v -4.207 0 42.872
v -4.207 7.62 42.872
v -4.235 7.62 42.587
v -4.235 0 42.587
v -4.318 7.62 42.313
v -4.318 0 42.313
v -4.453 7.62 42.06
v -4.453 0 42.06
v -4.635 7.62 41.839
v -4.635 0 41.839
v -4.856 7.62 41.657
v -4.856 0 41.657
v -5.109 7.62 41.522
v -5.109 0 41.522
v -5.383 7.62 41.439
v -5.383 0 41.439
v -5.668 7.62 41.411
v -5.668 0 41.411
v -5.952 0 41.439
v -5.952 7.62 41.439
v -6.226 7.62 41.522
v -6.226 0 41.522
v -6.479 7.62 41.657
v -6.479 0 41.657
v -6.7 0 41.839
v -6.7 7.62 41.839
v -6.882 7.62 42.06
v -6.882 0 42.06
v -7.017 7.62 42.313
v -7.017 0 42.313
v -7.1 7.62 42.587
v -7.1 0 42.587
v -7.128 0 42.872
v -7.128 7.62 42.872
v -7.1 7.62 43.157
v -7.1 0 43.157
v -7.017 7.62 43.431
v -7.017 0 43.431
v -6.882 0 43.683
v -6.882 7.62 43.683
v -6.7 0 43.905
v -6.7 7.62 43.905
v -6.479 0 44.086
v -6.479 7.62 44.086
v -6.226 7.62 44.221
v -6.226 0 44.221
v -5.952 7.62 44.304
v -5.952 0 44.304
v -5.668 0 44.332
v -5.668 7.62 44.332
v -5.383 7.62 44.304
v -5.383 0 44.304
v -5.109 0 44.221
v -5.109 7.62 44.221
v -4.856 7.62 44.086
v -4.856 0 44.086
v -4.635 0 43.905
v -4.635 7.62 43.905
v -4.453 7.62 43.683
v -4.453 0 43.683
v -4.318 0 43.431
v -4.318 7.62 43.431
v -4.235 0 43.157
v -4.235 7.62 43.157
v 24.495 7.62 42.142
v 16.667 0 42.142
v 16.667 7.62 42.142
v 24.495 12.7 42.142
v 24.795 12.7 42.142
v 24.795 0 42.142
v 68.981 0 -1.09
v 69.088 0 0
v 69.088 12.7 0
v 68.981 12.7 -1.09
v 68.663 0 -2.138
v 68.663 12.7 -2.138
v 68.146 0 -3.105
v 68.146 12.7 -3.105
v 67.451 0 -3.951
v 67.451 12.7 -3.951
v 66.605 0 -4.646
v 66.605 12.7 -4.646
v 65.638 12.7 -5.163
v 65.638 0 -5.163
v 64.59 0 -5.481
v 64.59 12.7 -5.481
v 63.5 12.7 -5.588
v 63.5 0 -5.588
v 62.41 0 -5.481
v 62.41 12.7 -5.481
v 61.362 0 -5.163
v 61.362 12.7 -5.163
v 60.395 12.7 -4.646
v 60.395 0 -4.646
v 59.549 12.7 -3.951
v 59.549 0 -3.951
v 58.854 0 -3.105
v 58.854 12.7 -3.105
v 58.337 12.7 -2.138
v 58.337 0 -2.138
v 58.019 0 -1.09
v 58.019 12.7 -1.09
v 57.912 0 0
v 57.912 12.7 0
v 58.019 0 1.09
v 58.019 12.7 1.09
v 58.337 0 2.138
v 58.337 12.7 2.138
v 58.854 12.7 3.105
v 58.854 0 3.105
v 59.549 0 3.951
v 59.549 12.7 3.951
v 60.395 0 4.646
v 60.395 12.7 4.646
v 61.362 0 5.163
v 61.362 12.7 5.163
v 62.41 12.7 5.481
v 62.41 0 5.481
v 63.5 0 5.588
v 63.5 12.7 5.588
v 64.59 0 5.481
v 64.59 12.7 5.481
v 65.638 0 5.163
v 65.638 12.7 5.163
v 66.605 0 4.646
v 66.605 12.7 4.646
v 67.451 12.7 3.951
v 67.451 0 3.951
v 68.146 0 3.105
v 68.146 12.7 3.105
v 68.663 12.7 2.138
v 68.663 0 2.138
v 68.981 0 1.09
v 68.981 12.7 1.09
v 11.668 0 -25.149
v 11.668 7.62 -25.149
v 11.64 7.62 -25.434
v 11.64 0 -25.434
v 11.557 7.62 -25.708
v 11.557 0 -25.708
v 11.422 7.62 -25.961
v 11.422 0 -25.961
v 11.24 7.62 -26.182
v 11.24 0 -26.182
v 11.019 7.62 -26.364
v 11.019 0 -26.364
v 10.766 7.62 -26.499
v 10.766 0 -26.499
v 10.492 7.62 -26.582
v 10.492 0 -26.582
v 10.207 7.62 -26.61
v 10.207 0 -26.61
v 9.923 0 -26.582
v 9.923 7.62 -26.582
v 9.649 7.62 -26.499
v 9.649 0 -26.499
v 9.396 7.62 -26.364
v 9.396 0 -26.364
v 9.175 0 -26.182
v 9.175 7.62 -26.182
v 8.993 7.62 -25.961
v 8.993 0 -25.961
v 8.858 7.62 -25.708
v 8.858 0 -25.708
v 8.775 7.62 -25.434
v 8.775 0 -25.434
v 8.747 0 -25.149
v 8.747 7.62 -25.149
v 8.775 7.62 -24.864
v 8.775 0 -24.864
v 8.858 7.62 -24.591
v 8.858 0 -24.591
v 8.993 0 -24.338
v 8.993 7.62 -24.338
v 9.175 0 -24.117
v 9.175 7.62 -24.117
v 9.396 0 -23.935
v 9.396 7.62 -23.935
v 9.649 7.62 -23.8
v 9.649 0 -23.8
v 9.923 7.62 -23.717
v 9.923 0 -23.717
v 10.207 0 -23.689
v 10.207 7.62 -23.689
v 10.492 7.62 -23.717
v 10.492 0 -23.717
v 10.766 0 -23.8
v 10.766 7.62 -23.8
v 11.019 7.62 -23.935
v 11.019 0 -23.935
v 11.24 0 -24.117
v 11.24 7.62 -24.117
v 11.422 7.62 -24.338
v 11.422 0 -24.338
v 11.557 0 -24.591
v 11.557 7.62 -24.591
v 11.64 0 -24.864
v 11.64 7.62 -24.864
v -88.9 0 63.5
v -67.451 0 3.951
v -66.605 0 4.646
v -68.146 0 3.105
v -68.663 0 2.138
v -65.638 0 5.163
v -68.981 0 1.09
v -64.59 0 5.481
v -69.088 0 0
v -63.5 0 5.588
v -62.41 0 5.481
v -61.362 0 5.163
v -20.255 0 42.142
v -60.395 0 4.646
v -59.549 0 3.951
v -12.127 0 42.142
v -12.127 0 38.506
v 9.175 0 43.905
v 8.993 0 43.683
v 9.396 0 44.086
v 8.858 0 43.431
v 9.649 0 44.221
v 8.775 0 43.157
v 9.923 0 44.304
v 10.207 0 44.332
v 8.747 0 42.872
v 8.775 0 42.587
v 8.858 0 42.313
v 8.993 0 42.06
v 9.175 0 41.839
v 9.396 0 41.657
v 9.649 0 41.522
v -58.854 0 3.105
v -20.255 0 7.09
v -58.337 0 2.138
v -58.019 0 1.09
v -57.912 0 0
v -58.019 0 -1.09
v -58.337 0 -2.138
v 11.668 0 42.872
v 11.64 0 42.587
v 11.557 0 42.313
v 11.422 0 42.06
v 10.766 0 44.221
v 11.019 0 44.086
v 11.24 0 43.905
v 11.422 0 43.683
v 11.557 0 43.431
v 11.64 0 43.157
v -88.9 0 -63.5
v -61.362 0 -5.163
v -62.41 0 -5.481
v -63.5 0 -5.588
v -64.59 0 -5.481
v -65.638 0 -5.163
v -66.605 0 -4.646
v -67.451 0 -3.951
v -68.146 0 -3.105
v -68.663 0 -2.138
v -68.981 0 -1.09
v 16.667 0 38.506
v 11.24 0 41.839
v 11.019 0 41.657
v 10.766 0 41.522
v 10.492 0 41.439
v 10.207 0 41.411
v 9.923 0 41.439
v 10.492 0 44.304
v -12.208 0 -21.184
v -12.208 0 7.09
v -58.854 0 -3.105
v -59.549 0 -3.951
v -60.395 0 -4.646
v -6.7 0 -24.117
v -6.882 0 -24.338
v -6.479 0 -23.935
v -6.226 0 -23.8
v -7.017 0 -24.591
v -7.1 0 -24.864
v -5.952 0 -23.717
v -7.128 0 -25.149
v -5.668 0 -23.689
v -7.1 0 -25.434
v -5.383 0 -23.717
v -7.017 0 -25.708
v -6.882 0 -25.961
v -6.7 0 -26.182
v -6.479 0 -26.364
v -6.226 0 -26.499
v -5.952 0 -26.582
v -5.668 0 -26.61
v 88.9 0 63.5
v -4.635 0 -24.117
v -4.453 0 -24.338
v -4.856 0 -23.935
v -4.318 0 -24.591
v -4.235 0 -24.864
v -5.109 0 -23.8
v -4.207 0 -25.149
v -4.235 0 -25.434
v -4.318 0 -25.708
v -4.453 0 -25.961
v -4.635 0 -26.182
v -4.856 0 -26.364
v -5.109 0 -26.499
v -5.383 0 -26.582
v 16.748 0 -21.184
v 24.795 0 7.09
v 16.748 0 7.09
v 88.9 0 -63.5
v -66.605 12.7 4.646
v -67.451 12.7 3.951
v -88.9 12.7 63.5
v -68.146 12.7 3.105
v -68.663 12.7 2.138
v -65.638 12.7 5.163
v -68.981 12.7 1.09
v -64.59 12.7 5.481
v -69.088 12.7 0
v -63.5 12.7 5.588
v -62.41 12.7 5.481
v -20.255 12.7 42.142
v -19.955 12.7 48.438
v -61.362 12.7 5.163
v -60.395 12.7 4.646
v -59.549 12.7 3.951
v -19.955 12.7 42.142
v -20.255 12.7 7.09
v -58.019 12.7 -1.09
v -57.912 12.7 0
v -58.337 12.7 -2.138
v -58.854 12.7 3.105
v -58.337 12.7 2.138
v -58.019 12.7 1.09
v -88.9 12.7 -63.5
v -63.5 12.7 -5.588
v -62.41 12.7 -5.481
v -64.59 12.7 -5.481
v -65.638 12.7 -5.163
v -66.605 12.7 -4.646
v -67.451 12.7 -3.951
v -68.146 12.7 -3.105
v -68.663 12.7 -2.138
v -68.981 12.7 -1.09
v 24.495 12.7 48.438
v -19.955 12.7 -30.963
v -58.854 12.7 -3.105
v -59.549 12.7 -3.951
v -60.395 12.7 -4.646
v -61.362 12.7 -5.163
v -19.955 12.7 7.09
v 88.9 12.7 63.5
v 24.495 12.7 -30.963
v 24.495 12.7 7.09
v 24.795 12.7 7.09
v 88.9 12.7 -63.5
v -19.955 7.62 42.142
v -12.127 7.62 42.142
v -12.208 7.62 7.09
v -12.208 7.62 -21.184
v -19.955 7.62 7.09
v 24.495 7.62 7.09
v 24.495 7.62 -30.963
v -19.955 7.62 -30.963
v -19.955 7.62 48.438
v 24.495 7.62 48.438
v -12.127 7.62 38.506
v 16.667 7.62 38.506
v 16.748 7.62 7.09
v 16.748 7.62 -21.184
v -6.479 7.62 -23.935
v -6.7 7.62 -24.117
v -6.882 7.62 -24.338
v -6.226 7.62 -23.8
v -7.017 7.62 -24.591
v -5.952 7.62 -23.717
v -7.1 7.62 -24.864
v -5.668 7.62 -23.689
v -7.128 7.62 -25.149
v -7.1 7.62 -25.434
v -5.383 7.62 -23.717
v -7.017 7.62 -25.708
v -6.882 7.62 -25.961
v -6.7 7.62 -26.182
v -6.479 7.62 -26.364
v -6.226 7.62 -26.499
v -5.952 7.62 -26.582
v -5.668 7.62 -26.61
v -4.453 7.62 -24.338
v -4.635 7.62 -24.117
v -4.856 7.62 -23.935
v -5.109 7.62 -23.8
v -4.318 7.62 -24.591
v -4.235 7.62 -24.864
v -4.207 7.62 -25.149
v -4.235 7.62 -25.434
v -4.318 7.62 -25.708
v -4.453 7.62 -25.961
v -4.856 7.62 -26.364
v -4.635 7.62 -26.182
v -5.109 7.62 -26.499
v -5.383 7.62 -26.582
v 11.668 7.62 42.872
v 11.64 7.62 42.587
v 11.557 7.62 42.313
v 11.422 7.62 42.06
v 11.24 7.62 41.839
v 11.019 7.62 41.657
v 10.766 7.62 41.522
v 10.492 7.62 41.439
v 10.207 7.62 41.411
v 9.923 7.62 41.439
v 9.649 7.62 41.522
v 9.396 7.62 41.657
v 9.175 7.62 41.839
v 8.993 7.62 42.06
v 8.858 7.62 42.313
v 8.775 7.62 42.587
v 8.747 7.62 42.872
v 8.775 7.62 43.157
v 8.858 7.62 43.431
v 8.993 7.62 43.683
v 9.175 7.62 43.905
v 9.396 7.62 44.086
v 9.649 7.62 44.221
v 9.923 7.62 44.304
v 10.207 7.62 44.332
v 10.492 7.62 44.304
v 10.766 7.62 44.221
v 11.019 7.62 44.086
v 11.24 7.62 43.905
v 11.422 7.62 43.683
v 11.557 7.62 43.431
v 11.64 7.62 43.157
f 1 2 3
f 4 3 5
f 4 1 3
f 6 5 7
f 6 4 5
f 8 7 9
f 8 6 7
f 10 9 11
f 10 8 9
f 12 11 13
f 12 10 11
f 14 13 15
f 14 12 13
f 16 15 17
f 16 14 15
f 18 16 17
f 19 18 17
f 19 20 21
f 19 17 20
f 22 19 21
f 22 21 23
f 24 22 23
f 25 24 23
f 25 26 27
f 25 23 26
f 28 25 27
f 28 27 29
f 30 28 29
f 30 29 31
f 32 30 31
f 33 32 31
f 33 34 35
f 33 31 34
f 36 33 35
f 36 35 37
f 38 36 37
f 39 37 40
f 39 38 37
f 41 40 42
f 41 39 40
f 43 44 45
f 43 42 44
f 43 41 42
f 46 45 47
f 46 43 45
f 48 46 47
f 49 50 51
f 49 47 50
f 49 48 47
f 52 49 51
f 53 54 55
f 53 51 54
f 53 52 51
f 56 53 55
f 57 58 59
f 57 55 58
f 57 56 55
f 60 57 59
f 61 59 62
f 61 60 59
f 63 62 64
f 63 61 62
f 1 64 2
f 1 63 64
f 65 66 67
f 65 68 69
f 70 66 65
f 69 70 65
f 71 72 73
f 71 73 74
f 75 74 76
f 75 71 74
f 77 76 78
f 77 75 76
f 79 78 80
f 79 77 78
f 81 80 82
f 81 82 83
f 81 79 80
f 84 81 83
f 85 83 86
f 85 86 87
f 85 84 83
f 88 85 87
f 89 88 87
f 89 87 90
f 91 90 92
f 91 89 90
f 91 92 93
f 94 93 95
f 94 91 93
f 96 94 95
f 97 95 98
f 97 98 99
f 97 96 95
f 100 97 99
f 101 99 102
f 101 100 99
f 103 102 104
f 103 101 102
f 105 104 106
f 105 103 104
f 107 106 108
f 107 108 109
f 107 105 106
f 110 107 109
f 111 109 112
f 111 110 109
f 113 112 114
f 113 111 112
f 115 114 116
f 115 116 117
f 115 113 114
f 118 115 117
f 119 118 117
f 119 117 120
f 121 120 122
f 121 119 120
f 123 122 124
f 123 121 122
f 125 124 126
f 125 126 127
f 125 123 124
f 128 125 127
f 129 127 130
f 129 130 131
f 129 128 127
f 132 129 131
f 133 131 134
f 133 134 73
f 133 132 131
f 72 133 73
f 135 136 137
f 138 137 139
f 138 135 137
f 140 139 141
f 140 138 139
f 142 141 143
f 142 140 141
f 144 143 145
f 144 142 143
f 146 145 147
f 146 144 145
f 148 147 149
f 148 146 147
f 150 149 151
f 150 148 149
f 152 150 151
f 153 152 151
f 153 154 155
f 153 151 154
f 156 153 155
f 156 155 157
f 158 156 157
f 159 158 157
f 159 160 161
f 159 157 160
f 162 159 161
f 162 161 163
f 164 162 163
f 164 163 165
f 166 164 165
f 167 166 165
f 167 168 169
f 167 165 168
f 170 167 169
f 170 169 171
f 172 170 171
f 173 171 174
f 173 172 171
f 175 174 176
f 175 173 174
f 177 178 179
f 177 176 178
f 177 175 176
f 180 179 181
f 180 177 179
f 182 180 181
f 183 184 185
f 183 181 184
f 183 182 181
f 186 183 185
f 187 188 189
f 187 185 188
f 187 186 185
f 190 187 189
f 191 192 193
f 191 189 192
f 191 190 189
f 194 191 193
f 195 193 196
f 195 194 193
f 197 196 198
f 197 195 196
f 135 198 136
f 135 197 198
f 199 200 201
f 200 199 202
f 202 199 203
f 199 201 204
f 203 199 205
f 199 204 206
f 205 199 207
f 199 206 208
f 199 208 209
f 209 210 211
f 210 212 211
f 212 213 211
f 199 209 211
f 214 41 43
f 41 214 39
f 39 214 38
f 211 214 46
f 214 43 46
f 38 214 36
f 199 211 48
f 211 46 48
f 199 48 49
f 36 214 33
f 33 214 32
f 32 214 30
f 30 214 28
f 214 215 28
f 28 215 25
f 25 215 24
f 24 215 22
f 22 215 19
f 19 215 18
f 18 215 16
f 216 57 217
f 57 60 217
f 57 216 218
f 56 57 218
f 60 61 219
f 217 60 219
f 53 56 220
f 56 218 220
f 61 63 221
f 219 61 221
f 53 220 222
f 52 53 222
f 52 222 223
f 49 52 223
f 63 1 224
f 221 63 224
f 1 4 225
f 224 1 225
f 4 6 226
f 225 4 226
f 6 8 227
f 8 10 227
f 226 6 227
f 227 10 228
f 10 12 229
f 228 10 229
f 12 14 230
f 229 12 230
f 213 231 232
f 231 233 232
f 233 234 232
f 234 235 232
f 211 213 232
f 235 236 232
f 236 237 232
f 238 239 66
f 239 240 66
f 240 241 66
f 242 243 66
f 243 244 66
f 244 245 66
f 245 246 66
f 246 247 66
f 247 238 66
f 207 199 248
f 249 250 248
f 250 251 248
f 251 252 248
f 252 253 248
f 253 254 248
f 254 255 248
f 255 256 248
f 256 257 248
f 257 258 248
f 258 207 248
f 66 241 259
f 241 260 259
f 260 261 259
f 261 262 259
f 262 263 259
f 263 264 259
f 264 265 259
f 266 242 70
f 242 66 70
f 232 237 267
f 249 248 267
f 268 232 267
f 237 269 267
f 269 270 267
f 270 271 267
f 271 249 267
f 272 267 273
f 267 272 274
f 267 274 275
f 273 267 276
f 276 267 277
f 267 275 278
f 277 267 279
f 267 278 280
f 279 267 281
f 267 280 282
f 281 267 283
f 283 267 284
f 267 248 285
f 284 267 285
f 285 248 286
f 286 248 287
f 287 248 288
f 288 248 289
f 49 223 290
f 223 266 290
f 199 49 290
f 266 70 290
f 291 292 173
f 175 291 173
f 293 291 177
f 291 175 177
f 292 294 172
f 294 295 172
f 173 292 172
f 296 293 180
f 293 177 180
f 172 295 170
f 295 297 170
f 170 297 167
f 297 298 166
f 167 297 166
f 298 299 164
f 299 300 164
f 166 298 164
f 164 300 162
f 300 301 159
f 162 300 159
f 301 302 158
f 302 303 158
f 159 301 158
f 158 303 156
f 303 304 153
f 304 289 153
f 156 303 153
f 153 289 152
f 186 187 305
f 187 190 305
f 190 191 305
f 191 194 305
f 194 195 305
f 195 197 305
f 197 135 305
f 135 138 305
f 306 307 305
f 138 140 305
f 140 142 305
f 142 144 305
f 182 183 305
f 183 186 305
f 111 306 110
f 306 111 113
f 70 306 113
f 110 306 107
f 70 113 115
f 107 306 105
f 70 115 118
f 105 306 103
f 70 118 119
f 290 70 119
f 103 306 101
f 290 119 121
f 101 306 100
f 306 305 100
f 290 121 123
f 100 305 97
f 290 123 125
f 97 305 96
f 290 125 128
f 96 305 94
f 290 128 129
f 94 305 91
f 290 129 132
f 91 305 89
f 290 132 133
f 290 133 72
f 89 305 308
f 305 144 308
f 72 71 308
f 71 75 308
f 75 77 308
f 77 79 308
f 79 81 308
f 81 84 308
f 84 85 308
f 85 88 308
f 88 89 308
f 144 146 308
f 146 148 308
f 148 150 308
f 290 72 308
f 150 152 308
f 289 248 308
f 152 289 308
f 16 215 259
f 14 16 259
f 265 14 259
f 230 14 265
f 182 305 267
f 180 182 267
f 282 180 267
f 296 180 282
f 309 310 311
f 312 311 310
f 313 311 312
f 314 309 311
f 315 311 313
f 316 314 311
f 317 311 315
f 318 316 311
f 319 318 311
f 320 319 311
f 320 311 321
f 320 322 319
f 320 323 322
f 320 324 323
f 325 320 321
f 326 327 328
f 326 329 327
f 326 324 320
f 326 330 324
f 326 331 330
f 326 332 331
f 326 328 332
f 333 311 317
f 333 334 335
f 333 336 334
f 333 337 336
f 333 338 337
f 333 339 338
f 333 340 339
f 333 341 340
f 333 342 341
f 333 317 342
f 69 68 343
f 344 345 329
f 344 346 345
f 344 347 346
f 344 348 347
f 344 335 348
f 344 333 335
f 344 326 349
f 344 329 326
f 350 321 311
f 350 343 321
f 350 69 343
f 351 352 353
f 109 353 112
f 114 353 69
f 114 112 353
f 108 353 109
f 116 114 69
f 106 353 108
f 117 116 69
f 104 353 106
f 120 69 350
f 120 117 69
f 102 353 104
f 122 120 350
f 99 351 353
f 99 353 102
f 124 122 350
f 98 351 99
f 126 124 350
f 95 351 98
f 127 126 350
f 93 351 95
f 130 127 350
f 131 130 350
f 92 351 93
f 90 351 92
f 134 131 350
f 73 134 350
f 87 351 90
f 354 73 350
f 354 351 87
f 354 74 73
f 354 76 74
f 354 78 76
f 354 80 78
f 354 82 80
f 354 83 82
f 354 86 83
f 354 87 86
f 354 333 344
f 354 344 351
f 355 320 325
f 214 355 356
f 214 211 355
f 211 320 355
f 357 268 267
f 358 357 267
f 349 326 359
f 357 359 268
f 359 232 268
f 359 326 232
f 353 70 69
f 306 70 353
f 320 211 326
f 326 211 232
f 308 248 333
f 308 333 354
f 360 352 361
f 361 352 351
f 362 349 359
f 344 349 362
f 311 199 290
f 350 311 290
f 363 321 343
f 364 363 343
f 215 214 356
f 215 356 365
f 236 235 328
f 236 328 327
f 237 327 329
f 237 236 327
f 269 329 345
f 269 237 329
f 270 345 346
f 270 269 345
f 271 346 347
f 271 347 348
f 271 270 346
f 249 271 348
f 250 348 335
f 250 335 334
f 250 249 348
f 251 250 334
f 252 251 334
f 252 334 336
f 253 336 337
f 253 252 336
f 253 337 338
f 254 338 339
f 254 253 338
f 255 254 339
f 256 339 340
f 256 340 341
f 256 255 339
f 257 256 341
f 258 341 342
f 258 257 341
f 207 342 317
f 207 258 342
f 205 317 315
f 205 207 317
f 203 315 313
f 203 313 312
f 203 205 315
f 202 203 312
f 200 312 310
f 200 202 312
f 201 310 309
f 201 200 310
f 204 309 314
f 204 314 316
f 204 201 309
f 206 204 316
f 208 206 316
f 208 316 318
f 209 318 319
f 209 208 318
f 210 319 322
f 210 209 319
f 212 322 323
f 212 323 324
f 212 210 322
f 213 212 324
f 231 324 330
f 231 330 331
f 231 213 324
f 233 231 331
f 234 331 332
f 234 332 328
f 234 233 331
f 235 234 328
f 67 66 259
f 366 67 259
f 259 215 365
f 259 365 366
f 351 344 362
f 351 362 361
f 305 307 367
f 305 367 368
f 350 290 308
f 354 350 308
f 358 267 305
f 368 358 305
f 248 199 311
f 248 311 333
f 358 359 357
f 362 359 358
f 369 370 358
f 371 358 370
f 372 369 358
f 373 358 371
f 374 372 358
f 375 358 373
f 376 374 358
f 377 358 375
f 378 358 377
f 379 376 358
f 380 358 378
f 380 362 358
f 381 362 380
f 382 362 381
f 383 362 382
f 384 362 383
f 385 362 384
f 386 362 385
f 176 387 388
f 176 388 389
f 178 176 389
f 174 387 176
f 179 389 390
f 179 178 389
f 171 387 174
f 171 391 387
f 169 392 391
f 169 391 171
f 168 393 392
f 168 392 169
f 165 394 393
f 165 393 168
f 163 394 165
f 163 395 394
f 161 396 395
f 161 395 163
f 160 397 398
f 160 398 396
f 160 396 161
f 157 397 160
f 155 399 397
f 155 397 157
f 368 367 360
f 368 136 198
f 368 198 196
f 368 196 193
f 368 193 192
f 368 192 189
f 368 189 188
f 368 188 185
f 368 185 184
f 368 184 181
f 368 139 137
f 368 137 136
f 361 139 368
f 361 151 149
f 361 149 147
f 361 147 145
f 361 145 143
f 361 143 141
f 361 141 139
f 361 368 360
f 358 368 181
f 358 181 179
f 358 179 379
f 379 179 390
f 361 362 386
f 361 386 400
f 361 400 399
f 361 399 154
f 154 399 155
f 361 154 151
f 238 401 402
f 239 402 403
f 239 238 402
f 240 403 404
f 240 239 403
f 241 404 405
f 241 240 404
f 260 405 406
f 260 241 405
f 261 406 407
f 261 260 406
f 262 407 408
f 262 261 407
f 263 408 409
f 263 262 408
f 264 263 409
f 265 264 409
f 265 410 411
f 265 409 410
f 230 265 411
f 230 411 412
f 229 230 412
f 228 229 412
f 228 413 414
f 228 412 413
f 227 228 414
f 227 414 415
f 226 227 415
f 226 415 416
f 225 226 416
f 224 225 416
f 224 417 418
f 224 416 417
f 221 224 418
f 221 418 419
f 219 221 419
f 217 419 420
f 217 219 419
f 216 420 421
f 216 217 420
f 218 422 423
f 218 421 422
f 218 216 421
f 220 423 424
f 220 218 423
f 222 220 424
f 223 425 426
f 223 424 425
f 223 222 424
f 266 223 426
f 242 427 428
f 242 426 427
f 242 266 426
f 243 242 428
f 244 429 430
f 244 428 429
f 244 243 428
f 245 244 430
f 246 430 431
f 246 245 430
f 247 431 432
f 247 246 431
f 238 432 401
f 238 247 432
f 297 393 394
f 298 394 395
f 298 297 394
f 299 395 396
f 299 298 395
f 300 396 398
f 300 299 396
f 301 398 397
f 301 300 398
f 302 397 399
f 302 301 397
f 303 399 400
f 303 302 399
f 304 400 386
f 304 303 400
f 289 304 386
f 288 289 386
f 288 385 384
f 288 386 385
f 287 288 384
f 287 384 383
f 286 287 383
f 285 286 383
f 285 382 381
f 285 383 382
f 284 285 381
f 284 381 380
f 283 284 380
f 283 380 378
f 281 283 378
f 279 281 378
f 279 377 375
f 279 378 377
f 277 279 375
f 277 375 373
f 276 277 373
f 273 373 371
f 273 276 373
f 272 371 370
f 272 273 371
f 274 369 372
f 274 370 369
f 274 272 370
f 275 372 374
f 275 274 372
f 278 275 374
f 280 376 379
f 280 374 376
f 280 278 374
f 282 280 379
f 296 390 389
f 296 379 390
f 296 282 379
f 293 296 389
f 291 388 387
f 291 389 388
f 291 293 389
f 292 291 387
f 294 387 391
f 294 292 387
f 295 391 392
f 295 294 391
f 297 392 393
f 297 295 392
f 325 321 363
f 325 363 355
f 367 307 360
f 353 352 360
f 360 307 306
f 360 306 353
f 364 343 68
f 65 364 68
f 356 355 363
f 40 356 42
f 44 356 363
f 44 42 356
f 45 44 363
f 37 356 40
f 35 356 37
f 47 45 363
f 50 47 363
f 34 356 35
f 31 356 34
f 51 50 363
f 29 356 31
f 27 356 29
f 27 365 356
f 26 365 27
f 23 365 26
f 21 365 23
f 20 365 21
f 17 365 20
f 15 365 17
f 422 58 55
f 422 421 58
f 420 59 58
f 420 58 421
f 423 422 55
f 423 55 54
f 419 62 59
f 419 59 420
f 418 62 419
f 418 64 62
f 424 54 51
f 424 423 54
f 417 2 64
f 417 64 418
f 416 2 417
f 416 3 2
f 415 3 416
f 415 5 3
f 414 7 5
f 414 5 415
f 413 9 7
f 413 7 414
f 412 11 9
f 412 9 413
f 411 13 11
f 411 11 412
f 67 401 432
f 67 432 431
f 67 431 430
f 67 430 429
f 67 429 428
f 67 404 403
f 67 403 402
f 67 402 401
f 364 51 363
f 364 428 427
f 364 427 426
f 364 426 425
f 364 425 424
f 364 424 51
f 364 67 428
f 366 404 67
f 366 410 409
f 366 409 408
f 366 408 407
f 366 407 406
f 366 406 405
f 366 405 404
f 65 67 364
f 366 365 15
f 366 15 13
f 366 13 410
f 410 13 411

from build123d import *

# Parameters (mm, degrees)
SKETCH1_W           = 177.8
SKETCH1_H           = 127
SKETCH1_R           = 5.588
SKETCH1_R_2         = 1.4605
SKETCH1_W_2         = 28.956
SKETCH1_H_2         = 59.69
BOSS_EXTRUDE1_DEPTH = 12.7
SKETCH3_W           = 8.128
SKETCH3_H           = 35.052
CUT_EXTRUDE3_DEPTH  = 13.7
SKETCH2_W           = 44.45
SKETCH2_H           = 79.4004
CUT_EXTRUDE4_DEPTH  = 5.08


with BuildPart() as part:
    # Sketch1 → Boss-Extrude1 (new body)
    with BuildSketch(Plane(origin=(0, 0, 0), x_dir=(1, 0, 0), z_dir=(0, 1, 0))):
        Rectangle(SKETCH1_W, SKETCH1_H)
        with Locations((-63.5, 0)):
            Circle(SKETCH1_R, mode=Mode.SUBTRACT)
        with Locations((63.5, 0)):
            Circle(SKETCH1_R, mode=Mode.SUBTRACT)
        with Locations((-5.667565537, -42.871775783)):
            Circle(SKETCH1_R_2, mode=Mode.SUBTRACT)
        with Locations((10.207434463, -42.871775783)):
            Circle(SKETCH1_R_2, mode=Mode.SUBTRACT)
        with Locations((-5.667565537, 25.149424217)):
            Circle(SKETCH1_R_2, mode=Mode.SUBTRACT)
        with Locations((10.207434463, 25.149424217)):
            Circle(SKETCH1_R_2, mode=Mode.SUBTRACT)
        with Locations((2.269934463, -8.661150783)):
            Rectangle(SKETCH1_W_2, SKETCH1_H_2, mode=Mode.SUBTRACT)
    extrude(amount=BOSS_EXTRUDE1_DEPTH)

    # Sketch3 → Cut-Extrude3 (cut, through all)
    with BuildSketch(Plane(origin=(0, 0, 0), x_dir=(1, 0, 0), z_dir=(0, 1, 0))):
        with Locations((-16.19114245, -24.615525783)):
            Rectangle(SKETCH3_W, SKETCH3_H)
        with Locations((20.731011375, -24.615525783)):
            Rectangle(SKETCH3_W, SKETCH3_H)
    extrude(amount=CUT_EXTRUDE3_DEPTH, mode=Mode.SUBTRACT)

    # Sketch2 → Cut-Extrude4 (cut)
    with BuildSketch(Plane(origin=(0, 12.7, 0), x_dir=(1, 0, 0), z_dir=(0, 1, 0))):
        with Locations((2.269934463, -8.737350783)):
            Rectangle(SKETCH2_W, SKETCH2_H)
    extrude(amount=-CUT_EXTRUDE4_DEPTH, mode=Mode.SUBTRACT)


solid = part.part
